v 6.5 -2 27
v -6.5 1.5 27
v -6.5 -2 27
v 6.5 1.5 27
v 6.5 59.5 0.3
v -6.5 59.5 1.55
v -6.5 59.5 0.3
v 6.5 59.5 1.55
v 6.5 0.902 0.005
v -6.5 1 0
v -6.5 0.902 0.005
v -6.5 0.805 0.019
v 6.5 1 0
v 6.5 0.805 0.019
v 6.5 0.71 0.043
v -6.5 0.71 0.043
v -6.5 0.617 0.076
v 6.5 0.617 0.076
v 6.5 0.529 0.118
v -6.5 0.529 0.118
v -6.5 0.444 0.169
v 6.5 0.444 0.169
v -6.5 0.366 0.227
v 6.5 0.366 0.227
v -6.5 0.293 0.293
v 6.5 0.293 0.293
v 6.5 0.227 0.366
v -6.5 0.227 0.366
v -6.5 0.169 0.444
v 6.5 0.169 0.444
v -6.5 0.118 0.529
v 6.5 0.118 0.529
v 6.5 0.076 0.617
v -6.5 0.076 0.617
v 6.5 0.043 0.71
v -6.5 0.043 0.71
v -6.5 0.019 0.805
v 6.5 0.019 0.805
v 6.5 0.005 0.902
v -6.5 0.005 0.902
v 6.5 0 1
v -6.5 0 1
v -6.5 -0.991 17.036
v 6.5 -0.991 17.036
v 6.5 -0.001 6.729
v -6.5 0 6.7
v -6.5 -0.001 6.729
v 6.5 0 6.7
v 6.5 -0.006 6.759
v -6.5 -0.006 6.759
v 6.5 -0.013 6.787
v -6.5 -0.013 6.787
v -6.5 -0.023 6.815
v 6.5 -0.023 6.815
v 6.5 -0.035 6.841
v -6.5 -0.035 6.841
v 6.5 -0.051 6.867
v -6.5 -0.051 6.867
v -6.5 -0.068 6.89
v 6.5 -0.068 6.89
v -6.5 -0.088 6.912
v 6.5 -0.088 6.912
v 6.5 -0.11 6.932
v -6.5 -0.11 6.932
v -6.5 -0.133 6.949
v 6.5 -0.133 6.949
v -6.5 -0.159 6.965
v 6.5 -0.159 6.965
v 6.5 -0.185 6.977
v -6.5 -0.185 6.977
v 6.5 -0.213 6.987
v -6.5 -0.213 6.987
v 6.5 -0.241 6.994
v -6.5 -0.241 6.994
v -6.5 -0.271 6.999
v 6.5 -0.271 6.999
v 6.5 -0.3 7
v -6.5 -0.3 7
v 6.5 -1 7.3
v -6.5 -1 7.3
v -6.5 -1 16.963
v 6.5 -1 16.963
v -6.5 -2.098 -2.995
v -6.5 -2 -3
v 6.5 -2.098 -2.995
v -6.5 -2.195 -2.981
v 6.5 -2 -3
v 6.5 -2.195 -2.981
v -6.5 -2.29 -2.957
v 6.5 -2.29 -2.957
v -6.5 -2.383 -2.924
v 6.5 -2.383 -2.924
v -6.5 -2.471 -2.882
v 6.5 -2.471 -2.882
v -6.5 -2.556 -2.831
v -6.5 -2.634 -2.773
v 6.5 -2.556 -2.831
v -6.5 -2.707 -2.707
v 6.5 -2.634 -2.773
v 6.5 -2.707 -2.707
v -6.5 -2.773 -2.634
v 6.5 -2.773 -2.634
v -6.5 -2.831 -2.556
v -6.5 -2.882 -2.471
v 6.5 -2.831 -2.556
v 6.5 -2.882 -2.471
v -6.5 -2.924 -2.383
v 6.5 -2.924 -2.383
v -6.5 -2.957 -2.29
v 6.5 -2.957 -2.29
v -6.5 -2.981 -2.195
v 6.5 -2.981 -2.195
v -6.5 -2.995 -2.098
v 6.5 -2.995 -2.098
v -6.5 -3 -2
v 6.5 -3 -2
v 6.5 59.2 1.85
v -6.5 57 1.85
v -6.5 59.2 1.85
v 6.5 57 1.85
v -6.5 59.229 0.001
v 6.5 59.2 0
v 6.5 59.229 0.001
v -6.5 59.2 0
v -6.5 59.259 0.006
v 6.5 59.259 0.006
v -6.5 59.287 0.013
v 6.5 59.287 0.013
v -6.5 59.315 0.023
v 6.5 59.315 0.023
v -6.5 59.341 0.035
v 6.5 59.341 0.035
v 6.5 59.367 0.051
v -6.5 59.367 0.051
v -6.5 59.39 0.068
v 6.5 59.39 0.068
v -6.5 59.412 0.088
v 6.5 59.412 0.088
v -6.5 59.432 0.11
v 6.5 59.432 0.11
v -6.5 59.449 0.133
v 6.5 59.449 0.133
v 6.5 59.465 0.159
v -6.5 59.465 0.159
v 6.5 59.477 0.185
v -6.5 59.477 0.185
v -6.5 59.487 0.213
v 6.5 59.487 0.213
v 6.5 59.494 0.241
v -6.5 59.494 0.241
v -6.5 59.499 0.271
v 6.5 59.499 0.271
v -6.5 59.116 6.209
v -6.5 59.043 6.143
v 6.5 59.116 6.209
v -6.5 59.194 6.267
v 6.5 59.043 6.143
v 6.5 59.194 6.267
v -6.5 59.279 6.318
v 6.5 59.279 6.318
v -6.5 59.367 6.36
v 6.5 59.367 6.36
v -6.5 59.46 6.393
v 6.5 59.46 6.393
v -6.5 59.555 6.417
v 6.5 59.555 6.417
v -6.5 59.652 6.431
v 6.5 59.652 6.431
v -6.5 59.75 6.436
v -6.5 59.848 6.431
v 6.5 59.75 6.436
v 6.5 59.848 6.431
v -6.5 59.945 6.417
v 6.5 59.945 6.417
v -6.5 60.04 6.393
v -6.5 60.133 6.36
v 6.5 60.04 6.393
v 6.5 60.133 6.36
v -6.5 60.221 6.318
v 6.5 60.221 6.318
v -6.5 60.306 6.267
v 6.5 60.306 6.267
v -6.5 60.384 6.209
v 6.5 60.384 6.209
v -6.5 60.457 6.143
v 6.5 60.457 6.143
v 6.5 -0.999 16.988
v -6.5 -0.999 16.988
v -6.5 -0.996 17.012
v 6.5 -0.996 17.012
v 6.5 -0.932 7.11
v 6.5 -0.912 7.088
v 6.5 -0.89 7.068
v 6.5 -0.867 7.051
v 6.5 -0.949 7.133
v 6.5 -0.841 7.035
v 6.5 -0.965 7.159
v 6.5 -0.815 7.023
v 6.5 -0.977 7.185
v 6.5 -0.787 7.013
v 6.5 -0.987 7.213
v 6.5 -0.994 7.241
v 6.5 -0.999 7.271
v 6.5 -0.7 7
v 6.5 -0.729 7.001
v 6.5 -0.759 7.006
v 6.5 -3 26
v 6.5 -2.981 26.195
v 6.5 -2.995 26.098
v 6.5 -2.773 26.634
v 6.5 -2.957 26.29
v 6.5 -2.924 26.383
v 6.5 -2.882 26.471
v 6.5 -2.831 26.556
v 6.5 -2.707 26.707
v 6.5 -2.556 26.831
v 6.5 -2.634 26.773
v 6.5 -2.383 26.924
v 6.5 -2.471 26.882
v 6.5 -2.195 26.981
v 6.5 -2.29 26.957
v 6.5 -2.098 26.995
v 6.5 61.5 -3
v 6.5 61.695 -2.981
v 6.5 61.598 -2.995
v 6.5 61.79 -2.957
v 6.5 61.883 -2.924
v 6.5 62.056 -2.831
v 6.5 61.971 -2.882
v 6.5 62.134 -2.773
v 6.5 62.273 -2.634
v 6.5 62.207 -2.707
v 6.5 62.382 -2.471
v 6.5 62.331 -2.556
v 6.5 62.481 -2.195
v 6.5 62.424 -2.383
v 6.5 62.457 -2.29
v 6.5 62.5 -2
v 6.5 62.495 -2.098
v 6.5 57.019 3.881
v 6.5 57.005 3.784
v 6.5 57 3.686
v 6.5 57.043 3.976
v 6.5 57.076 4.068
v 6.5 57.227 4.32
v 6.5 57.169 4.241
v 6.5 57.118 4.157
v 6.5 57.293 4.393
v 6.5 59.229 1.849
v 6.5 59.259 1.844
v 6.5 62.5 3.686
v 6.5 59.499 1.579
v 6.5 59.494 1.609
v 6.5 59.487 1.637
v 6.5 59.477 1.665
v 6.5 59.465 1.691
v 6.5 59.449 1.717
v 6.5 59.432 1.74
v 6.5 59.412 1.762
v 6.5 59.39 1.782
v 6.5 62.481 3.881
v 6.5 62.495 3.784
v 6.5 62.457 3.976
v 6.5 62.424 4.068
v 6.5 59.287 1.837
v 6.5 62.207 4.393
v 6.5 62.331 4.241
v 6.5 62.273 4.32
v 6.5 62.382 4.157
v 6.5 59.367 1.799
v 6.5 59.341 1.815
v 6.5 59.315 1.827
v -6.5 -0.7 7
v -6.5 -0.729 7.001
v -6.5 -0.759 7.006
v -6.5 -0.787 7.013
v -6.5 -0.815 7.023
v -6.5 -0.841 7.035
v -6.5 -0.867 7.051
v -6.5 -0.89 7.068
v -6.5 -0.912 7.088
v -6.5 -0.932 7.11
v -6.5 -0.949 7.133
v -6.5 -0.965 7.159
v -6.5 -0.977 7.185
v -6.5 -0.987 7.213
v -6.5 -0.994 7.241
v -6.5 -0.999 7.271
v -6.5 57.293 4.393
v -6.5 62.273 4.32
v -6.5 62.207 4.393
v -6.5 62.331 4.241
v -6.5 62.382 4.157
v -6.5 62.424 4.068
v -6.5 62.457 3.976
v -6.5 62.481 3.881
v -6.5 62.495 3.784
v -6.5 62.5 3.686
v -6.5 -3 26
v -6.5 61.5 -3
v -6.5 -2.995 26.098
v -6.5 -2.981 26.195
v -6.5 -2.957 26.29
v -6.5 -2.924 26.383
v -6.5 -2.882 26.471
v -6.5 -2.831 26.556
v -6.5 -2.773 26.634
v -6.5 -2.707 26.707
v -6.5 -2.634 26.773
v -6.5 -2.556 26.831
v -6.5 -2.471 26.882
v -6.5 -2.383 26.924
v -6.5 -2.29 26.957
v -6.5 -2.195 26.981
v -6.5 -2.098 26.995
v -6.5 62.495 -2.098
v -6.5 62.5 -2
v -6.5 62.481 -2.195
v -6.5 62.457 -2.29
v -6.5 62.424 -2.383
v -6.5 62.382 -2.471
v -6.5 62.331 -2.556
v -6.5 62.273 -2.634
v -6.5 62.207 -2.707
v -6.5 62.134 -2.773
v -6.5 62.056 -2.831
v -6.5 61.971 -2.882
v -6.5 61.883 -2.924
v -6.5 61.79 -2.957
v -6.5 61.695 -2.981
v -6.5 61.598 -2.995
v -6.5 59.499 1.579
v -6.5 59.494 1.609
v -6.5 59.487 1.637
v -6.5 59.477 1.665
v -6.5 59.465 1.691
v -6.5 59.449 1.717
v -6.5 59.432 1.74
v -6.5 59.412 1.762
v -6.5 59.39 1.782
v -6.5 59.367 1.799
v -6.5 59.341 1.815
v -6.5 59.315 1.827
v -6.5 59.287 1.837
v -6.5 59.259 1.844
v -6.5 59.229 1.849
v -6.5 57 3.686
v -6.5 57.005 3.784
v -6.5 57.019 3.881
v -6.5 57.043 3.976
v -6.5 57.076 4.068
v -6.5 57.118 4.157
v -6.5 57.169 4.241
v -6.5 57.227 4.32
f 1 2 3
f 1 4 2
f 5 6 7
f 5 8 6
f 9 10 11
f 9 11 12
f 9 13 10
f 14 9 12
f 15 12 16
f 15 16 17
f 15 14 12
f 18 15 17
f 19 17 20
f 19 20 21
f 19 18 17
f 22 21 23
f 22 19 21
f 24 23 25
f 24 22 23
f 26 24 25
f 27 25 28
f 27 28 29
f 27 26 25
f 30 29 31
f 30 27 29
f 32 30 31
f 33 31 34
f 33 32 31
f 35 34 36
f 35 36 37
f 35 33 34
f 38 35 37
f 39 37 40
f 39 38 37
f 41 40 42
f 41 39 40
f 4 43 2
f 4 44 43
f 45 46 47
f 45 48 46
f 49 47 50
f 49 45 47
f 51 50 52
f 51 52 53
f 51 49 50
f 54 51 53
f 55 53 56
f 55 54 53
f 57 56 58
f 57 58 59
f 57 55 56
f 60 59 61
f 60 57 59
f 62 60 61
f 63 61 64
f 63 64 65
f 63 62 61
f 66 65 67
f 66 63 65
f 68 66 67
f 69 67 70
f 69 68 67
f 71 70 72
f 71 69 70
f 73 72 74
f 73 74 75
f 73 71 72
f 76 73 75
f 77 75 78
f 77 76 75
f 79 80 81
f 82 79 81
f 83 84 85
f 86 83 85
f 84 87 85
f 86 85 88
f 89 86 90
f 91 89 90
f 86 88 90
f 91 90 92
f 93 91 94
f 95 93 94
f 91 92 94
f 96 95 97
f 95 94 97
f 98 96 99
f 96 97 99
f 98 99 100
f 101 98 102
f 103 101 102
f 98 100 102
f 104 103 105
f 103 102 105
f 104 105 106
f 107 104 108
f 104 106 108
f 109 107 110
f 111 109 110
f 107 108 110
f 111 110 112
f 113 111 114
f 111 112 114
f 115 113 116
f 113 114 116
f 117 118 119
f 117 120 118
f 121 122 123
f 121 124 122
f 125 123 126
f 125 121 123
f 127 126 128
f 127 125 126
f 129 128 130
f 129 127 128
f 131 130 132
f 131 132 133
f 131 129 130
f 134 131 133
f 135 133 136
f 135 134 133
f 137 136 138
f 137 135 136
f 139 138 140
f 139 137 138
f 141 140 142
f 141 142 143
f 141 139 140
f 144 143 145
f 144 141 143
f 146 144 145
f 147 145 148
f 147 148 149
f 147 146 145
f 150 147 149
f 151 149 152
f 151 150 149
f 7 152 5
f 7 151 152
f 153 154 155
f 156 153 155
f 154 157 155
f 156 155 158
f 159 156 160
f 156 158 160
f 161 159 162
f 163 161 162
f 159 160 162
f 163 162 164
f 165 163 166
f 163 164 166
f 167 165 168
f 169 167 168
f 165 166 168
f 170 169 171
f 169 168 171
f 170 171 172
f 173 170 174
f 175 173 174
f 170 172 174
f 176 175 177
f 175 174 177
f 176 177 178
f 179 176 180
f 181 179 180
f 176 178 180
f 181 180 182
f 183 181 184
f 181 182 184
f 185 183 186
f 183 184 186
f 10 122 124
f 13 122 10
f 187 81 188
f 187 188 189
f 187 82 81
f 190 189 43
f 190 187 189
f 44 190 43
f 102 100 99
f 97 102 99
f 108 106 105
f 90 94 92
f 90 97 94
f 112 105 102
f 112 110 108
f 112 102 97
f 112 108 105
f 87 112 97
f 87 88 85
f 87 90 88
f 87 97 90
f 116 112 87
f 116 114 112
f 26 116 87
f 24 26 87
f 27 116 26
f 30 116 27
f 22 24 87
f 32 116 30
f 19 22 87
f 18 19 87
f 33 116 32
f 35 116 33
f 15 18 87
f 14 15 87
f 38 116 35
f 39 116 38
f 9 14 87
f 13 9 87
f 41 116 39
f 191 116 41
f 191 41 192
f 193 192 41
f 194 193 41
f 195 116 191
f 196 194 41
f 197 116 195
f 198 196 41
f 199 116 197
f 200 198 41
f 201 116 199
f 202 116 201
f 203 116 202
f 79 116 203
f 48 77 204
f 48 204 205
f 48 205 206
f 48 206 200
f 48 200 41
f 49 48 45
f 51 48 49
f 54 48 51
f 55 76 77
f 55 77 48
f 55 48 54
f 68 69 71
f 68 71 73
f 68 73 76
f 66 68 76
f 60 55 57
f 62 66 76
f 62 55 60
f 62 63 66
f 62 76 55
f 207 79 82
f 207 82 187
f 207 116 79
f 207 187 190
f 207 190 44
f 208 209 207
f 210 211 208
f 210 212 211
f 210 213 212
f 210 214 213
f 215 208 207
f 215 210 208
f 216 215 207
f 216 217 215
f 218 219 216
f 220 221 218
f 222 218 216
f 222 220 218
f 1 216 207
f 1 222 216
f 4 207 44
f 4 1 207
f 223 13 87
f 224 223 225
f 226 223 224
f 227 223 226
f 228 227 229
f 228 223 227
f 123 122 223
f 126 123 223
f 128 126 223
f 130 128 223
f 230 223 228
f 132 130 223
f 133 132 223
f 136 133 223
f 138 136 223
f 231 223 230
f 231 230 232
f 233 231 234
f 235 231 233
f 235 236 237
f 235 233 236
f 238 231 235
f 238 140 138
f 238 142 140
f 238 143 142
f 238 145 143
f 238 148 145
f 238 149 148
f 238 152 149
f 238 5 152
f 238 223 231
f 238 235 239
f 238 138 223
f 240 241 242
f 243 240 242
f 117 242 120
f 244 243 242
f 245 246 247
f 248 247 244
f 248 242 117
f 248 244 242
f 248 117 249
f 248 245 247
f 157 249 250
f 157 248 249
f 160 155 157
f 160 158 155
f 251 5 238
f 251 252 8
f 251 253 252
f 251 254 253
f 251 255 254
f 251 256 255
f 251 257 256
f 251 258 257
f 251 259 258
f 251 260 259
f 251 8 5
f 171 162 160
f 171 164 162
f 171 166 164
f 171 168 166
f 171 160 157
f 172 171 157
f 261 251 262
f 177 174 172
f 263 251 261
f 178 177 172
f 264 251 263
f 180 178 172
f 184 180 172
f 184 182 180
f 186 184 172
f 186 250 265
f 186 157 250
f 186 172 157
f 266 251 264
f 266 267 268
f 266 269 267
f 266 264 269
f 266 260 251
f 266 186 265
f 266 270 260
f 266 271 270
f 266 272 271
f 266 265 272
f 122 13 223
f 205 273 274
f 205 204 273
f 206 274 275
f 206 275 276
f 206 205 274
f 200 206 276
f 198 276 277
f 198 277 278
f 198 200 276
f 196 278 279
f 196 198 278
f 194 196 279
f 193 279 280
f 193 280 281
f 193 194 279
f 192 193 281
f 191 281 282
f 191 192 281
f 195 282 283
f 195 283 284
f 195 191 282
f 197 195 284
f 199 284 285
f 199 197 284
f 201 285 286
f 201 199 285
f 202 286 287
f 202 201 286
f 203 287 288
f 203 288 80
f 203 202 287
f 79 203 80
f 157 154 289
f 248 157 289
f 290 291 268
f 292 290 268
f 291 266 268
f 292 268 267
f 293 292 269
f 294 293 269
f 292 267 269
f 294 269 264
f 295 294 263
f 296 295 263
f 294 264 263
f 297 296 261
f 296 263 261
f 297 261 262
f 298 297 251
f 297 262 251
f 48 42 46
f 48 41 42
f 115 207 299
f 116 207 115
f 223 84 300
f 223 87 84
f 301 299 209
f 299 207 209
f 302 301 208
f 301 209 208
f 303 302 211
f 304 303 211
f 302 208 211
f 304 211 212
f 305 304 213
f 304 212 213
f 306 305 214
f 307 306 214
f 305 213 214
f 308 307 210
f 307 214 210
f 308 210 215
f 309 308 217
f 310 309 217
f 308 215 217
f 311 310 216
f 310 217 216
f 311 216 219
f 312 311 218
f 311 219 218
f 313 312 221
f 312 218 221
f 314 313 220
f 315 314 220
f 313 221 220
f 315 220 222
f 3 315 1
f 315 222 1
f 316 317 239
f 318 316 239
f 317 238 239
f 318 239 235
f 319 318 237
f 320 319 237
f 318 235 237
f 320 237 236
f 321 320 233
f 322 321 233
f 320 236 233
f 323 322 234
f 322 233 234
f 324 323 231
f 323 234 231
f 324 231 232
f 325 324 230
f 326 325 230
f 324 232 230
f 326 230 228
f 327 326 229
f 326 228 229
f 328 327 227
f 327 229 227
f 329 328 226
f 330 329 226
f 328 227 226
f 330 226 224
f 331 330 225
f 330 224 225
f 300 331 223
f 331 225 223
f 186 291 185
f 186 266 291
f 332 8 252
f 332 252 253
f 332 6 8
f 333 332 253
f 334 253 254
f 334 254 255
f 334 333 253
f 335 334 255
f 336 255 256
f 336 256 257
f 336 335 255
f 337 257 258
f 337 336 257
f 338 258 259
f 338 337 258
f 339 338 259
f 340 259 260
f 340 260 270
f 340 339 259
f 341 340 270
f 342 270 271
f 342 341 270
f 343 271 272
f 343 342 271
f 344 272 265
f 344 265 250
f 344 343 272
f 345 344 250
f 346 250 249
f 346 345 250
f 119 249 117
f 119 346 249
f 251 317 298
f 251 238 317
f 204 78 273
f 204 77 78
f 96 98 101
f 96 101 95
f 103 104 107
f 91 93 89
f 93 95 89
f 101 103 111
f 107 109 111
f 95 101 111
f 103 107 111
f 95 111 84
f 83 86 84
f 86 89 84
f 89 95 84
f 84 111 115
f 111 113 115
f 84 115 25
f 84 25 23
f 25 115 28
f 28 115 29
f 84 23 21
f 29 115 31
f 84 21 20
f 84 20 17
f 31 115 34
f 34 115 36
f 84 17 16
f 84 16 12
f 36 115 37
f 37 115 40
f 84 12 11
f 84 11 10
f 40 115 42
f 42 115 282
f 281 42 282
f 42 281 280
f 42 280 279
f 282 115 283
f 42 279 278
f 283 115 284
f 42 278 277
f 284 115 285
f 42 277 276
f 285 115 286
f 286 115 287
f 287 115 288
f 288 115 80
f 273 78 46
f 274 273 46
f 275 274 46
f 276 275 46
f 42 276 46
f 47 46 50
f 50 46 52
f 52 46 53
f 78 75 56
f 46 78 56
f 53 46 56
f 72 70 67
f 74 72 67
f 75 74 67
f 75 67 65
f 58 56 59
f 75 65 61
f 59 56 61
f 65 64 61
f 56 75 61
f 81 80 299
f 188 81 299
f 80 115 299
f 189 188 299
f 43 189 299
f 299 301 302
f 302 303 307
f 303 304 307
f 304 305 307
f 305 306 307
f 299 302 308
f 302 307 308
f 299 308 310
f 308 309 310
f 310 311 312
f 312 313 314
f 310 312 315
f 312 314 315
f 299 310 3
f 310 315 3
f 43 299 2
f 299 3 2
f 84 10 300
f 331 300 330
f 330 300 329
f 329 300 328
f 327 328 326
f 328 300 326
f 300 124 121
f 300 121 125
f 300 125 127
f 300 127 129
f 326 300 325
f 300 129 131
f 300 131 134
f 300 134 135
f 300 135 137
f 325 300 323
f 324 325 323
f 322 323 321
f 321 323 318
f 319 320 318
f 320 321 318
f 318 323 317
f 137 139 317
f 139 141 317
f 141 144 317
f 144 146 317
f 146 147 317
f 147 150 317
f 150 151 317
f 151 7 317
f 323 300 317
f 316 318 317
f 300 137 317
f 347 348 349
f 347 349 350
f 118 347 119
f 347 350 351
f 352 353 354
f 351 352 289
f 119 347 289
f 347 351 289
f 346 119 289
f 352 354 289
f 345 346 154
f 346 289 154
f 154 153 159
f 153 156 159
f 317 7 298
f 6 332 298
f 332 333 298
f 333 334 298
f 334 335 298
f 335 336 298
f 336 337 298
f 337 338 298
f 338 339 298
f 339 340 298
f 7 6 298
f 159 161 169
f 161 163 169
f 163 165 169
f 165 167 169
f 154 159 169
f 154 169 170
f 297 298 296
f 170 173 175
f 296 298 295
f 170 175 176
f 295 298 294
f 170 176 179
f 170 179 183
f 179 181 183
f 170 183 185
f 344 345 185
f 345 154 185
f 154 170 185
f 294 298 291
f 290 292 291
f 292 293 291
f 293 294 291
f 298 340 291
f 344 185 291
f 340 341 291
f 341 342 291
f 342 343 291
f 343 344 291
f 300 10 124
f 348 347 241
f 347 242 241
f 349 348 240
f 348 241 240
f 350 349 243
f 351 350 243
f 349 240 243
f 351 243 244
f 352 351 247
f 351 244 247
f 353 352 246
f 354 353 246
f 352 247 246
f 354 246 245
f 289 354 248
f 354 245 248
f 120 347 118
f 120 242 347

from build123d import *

# Parameters (mm, degrees)
F2_DEPTH = 6.5
F3_R     = 1
F4_R     = 0.3


with BuildPart() as f2:
    # F1 (on Right) → F2 (new body, symmetric)
    with BuildSketch(Plane.YZ):
        Polygon((59.5, 0), (0, 0), (0, 7), (-1, 7), (-1, 17), (1.5, 27), (-3, 27), (-3, -3), (0, -3), (59.5, -3), (62.5, -3), (62.5, 4.1), (59.75, 6.85), (57, 4.1), (57, 1.85), (59.5, 1.85), align=None)
    extrude(amount=F2_DEPTH, both=True)

    # F3
    f3_edges = [f2.edges().sort_by_distance(p)[0] for p in [
        (0, 62.5, -3),
        (0, -3, -3),
        (0, -3, 27),
        (0, 62.5, 4.1),
        (0, 59.75, 6.85),
        (0, 57, 4.1),
        (0, 0, 0),
    ]]
    fillet(f3_edges, radius=F3_R)

    # F4
    f4_edges = [f2.edges().sort_by_distance(p)[0] for p in [
        (0, -1, 17),
        (0, 59.5, 0),
        (0, 59.5, 1.85),
        (0, 0, 7),
        (0, -1, 7),
    ]]
    fillet(f4_edges, radius=F4_R)


solid = f2.part
